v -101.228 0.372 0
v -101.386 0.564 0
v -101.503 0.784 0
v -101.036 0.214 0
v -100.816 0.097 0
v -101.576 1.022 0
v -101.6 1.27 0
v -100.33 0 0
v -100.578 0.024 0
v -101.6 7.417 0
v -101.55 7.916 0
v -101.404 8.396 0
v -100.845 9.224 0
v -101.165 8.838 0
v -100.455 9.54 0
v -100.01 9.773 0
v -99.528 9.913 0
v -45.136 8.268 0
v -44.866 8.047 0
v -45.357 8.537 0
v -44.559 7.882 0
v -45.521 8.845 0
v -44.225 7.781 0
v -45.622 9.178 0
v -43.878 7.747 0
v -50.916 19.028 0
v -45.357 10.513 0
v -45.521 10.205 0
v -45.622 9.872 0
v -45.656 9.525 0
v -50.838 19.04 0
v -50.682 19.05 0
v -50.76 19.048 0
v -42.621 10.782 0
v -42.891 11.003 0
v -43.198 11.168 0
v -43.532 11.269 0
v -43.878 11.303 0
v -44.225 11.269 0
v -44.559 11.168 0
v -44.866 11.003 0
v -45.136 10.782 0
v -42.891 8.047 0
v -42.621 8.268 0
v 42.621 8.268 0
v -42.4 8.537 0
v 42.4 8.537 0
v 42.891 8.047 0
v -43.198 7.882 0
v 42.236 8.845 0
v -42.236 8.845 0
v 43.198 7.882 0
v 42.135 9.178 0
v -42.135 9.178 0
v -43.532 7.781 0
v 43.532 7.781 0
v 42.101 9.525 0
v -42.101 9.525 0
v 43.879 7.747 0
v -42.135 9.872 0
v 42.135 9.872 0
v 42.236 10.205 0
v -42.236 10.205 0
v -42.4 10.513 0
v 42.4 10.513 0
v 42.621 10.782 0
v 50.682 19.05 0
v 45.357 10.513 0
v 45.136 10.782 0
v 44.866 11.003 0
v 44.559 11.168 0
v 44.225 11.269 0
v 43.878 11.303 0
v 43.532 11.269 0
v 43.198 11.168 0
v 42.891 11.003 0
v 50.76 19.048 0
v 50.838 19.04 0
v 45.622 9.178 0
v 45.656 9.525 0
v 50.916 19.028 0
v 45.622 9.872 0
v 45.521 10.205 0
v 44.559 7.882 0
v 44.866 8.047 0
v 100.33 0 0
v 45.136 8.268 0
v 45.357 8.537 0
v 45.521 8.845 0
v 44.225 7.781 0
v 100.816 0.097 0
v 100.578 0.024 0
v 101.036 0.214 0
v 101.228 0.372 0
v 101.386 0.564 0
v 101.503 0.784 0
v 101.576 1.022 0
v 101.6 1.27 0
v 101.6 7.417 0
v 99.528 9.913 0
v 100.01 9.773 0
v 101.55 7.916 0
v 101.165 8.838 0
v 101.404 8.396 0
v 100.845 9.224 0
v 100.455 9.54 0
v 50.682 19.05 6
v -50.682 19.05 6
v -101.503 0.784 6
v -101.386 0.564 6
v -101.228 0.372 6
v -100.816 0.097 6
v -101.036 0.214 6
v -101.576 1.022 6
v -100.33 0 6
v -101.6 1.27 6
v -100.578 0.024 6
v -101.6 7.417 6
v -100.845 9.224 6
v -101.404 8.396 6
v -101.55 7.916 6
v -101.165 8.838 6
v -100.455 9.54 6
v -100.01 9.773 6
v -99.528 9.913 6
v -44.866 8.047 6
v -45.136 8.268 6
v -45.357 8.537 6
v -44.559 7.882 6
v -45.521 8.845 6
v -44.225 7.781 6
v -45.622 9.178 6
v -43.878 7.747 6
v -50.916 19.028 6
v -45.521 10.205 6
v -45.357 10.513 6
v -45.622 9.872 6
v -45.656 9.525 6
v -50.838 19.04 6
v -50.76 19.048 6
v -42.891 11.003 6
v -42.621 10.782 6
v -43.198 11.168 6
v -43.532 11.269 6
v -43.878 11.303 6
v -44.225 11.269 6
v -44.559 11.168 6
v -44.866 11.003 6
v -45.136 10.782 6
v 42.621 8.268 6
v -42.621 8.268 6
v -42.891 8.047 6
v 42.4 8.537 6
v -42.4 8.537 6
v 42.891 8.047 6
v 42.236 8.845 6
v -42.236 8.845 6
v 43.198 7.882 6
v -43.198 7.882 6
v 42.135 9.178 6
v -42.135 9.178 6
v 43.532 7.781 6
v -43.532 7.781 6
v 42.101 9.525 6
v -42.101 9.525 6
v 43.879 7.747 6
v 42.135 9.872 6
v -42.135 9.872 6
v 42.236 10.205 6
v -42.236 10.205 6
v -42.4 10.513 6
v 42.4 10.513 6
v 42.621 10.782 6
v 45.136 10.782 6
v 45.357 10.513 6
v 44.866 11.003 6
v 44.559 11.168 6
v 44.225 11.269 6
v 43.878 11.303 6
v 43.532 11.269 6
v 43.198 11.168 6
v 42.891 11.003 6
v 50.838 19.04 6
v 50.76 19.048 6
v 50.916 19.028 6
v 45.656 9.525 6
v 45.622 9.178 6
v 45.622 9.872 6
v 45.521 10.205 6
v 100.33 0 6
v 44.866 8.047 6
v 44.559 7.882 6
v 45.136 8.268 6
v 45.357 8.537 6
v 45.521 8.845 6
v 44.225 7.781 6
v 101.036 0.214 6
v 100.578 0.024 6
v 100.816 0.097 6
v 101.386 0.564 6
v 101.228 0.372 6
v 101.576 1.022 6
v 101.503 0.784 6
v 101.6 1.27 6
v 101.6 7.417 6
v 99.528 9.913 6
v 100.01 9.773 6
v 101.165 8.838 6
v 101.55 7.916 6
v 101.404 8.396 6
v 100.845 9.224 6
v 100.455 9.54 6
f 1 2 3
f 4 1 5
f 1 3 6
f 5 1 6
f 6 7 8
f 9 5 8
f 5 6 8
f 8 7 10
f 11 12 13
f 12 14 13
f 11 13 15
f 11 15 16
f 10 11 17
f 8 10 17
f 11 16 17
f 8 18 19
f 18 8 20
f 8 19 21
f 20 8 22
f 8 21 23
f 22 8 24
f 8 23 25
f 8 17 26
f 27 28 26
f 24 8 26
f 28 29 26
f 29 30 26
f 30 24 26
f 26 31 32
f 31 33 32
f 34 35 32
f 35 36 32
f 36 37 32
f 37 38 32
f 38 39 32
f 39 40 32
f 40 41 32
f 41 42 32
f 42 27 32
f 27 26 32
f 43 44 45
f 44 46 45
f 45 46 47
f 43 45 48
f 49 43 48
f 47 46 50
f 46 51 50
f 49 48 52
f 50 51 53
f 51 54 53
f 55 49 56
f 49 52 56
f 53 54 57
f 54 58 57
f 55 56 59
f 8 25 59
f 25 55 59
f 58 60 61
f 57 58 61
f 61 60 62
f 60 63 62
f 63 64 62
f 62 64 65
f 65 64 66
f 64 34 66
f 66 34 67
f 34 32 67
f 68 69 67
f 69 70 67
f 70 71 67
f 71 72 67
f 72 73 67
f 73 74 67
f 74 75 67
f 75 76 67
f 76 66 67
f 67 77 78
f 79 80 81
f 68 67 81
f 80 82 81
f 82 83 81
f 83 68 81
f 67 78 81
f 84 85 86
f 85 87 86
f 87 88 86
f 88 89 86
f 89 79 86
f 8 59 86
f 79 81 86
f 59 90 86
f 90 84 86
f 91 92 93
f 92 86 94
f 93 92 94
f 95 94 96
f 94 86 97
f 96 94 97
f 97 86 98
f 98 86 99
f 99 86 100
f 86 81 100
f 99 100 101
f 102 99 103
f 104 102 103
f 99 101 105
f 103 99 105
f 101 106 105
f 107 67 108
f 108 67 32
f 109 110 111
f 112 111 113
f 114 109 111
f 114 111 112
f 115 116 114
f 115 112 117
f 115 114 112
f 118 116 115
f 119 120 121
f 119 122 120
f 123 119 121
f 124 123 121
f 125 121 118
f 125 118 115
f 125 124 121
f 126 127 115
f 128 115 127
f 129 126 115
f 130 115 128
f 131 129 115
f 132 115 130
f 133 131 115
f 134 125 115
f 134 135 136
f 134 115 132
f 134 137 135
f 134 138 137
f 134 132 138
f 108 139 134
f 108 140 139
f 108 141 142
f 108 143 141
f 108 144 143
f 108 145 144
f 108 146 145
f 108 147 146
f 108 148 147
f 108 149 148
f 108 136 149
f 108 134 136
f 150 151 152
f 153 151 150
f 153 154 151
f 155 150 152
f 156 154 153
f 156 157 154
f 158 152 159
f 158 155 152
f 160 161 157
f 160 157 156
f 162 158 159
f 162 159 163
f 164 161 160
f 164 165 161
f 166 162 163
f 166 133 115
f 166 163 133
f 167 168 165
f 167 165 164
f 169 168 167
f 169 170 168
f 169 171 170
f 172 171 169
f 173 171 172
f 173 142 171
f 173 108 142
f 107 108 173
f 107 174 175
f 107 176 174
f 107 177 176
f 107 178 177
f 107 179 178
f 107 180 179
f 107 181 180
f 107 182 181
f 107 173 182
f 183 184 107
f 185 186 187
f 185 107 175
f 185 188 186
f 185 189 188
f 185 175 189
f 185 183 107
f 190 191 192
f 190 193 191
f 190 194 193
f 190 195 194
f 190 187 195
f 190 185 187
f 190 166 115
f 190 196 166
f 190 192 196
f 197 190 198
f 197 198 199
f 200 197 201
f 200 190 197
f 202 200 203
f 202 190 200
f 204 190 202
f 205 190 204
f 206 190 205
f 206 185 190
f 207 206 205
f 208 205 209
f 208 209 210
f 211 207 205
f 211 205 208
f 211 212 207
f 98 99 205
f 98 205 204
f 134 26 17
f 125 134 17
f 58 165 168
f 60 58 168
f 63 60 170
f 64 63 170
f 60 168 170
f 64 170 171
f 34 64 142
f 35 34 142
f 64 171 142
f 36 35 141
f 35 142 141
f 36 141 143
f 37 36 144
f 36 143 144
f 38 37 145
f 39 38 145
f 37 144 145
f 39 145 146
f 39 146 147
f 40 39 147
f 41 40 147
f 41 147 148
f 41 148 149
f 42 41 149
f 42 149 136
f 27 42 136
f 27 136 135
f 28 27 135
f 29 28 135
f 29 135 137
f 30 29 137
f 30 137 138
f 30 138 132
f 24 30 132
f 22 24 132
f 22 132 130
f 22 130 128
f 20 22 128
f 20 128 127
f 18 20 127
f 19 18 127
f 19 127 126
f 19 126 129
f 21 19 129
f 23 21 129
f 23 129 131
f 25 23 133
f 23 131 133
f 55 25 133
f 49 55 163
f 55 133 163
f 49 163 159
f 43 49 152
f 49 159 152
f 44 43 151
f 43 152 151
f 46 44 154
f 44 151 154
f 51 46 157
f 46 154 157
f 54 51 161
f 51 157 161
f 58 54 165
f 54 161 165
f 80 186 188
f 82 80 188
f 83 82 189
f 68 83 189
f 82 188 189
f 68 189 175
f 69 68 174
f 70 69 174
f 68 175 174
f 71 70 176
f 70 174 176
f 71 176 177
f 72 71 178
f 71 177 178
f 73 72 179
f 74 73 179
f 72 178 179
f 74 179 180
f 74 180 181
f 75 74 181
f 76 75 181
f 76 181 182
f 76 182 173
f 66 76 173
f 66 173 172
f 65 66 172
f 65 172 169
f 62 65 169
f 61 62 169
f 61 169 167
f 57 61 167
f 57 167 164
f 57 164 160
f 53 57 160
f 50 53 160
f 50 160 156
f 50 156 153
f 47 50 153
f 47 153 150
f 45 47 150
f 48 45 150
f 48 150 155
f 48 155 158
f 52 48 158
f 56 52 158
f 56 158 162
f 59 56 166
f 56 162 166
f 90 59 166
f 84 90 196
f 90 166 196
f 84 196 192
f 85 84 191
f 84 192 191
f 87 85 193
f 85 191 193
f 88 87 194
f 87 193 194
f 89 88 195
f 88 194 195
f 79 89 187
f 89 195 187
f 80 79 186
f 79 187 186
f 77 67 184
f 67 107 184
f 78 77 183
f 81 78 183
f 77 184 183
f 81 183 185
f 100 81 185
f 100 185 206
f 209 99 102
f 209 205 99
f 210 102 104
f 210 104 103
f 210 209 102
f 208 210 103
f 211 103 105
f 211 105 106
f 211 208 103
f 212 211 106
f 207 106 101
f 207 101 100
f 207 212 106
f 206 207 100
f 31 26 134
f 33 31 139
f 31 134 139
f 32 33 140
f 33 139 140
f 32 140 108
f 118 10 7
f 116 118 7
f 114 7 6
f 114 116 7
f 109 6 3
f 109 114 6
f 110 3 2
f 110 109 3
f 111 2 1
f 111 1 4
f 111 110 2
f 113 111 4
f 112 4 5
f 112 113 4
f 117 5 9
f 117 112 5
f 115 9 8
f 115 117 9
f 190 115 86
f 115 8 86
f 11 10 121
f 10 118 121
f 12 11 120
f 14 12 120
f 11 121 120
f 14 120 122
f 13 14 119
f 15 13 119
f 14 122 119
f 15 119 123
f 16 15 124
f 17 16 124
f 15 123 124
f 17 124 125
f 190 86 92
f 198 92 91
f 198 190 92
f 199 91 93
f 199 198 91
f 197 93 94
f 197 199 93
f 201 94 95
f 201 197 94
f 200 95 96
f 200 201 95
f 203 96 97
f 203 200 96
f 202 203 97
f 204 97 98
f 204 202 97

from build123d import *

# Parameters (mm, degrees)
BOSS_EXTRUDE1_DEPTH = 6
FILLET1_R           = 2.54
FILLET2_R           = 1.27
SKETCH2_R           = 1.778
CUT_EXTRUDE1_DEPTH  = 104.544495267


with BuildPart() as part:
    # Sketch1 → Boss-Extrude1 (new body)
    with BuildSketch(Plane.XY):
        Polygon((0, 0), (0, 19.05), (50.8, 19.05), (101.6, 9.525), (101.6, 0), align=None)
    boss_extrude1 = extrude(amount=BOSS_EXTRUDE1_DEPTH)

    # Mirror1: Boss-Extrude1 across plane
    add(boss_extrude1.mirror(Plane(origin=(0, 0, 6), x_dir=(0, 0, 1), z_dir=(1, 0, 0))))

    # Fillet1
    fillet1_edges = [part.edges().sort_by_distance(p)[0] for p in [
        (-101.6, 9.525, 3),
        (101.6, 9.525, 3),
    ]]
    fillet(fillet1_edges, radius=FILLET1_R)

    # Fillet2
    fillet2_edges = [part.edges().sort_by_distance(p)[0] for p in [
        (-101.6, 0, 3),
        (-50.8, 19.05, 3),
        (50.8, 19.05, 3),
        (101.6, 0, 3),
    ]]
    fillet(fillet2_edges, radius=FILLET2_R)

    # Sketch2 → Cut-Extrude1 (cut, through all)
    with BuildSketch(Plane.XY.offset(6)):
        with Locations((-43.8785, 9.525)):
            Circle(SKETCH2_R)
        with Locations((43.8785, 9.525)):
            Circle(SKETCH2_R)
    extrude(amount=-CUT_EXTRUDE1_DEPTH, mode=Mode.SUBTRACT)


solid = part.part
